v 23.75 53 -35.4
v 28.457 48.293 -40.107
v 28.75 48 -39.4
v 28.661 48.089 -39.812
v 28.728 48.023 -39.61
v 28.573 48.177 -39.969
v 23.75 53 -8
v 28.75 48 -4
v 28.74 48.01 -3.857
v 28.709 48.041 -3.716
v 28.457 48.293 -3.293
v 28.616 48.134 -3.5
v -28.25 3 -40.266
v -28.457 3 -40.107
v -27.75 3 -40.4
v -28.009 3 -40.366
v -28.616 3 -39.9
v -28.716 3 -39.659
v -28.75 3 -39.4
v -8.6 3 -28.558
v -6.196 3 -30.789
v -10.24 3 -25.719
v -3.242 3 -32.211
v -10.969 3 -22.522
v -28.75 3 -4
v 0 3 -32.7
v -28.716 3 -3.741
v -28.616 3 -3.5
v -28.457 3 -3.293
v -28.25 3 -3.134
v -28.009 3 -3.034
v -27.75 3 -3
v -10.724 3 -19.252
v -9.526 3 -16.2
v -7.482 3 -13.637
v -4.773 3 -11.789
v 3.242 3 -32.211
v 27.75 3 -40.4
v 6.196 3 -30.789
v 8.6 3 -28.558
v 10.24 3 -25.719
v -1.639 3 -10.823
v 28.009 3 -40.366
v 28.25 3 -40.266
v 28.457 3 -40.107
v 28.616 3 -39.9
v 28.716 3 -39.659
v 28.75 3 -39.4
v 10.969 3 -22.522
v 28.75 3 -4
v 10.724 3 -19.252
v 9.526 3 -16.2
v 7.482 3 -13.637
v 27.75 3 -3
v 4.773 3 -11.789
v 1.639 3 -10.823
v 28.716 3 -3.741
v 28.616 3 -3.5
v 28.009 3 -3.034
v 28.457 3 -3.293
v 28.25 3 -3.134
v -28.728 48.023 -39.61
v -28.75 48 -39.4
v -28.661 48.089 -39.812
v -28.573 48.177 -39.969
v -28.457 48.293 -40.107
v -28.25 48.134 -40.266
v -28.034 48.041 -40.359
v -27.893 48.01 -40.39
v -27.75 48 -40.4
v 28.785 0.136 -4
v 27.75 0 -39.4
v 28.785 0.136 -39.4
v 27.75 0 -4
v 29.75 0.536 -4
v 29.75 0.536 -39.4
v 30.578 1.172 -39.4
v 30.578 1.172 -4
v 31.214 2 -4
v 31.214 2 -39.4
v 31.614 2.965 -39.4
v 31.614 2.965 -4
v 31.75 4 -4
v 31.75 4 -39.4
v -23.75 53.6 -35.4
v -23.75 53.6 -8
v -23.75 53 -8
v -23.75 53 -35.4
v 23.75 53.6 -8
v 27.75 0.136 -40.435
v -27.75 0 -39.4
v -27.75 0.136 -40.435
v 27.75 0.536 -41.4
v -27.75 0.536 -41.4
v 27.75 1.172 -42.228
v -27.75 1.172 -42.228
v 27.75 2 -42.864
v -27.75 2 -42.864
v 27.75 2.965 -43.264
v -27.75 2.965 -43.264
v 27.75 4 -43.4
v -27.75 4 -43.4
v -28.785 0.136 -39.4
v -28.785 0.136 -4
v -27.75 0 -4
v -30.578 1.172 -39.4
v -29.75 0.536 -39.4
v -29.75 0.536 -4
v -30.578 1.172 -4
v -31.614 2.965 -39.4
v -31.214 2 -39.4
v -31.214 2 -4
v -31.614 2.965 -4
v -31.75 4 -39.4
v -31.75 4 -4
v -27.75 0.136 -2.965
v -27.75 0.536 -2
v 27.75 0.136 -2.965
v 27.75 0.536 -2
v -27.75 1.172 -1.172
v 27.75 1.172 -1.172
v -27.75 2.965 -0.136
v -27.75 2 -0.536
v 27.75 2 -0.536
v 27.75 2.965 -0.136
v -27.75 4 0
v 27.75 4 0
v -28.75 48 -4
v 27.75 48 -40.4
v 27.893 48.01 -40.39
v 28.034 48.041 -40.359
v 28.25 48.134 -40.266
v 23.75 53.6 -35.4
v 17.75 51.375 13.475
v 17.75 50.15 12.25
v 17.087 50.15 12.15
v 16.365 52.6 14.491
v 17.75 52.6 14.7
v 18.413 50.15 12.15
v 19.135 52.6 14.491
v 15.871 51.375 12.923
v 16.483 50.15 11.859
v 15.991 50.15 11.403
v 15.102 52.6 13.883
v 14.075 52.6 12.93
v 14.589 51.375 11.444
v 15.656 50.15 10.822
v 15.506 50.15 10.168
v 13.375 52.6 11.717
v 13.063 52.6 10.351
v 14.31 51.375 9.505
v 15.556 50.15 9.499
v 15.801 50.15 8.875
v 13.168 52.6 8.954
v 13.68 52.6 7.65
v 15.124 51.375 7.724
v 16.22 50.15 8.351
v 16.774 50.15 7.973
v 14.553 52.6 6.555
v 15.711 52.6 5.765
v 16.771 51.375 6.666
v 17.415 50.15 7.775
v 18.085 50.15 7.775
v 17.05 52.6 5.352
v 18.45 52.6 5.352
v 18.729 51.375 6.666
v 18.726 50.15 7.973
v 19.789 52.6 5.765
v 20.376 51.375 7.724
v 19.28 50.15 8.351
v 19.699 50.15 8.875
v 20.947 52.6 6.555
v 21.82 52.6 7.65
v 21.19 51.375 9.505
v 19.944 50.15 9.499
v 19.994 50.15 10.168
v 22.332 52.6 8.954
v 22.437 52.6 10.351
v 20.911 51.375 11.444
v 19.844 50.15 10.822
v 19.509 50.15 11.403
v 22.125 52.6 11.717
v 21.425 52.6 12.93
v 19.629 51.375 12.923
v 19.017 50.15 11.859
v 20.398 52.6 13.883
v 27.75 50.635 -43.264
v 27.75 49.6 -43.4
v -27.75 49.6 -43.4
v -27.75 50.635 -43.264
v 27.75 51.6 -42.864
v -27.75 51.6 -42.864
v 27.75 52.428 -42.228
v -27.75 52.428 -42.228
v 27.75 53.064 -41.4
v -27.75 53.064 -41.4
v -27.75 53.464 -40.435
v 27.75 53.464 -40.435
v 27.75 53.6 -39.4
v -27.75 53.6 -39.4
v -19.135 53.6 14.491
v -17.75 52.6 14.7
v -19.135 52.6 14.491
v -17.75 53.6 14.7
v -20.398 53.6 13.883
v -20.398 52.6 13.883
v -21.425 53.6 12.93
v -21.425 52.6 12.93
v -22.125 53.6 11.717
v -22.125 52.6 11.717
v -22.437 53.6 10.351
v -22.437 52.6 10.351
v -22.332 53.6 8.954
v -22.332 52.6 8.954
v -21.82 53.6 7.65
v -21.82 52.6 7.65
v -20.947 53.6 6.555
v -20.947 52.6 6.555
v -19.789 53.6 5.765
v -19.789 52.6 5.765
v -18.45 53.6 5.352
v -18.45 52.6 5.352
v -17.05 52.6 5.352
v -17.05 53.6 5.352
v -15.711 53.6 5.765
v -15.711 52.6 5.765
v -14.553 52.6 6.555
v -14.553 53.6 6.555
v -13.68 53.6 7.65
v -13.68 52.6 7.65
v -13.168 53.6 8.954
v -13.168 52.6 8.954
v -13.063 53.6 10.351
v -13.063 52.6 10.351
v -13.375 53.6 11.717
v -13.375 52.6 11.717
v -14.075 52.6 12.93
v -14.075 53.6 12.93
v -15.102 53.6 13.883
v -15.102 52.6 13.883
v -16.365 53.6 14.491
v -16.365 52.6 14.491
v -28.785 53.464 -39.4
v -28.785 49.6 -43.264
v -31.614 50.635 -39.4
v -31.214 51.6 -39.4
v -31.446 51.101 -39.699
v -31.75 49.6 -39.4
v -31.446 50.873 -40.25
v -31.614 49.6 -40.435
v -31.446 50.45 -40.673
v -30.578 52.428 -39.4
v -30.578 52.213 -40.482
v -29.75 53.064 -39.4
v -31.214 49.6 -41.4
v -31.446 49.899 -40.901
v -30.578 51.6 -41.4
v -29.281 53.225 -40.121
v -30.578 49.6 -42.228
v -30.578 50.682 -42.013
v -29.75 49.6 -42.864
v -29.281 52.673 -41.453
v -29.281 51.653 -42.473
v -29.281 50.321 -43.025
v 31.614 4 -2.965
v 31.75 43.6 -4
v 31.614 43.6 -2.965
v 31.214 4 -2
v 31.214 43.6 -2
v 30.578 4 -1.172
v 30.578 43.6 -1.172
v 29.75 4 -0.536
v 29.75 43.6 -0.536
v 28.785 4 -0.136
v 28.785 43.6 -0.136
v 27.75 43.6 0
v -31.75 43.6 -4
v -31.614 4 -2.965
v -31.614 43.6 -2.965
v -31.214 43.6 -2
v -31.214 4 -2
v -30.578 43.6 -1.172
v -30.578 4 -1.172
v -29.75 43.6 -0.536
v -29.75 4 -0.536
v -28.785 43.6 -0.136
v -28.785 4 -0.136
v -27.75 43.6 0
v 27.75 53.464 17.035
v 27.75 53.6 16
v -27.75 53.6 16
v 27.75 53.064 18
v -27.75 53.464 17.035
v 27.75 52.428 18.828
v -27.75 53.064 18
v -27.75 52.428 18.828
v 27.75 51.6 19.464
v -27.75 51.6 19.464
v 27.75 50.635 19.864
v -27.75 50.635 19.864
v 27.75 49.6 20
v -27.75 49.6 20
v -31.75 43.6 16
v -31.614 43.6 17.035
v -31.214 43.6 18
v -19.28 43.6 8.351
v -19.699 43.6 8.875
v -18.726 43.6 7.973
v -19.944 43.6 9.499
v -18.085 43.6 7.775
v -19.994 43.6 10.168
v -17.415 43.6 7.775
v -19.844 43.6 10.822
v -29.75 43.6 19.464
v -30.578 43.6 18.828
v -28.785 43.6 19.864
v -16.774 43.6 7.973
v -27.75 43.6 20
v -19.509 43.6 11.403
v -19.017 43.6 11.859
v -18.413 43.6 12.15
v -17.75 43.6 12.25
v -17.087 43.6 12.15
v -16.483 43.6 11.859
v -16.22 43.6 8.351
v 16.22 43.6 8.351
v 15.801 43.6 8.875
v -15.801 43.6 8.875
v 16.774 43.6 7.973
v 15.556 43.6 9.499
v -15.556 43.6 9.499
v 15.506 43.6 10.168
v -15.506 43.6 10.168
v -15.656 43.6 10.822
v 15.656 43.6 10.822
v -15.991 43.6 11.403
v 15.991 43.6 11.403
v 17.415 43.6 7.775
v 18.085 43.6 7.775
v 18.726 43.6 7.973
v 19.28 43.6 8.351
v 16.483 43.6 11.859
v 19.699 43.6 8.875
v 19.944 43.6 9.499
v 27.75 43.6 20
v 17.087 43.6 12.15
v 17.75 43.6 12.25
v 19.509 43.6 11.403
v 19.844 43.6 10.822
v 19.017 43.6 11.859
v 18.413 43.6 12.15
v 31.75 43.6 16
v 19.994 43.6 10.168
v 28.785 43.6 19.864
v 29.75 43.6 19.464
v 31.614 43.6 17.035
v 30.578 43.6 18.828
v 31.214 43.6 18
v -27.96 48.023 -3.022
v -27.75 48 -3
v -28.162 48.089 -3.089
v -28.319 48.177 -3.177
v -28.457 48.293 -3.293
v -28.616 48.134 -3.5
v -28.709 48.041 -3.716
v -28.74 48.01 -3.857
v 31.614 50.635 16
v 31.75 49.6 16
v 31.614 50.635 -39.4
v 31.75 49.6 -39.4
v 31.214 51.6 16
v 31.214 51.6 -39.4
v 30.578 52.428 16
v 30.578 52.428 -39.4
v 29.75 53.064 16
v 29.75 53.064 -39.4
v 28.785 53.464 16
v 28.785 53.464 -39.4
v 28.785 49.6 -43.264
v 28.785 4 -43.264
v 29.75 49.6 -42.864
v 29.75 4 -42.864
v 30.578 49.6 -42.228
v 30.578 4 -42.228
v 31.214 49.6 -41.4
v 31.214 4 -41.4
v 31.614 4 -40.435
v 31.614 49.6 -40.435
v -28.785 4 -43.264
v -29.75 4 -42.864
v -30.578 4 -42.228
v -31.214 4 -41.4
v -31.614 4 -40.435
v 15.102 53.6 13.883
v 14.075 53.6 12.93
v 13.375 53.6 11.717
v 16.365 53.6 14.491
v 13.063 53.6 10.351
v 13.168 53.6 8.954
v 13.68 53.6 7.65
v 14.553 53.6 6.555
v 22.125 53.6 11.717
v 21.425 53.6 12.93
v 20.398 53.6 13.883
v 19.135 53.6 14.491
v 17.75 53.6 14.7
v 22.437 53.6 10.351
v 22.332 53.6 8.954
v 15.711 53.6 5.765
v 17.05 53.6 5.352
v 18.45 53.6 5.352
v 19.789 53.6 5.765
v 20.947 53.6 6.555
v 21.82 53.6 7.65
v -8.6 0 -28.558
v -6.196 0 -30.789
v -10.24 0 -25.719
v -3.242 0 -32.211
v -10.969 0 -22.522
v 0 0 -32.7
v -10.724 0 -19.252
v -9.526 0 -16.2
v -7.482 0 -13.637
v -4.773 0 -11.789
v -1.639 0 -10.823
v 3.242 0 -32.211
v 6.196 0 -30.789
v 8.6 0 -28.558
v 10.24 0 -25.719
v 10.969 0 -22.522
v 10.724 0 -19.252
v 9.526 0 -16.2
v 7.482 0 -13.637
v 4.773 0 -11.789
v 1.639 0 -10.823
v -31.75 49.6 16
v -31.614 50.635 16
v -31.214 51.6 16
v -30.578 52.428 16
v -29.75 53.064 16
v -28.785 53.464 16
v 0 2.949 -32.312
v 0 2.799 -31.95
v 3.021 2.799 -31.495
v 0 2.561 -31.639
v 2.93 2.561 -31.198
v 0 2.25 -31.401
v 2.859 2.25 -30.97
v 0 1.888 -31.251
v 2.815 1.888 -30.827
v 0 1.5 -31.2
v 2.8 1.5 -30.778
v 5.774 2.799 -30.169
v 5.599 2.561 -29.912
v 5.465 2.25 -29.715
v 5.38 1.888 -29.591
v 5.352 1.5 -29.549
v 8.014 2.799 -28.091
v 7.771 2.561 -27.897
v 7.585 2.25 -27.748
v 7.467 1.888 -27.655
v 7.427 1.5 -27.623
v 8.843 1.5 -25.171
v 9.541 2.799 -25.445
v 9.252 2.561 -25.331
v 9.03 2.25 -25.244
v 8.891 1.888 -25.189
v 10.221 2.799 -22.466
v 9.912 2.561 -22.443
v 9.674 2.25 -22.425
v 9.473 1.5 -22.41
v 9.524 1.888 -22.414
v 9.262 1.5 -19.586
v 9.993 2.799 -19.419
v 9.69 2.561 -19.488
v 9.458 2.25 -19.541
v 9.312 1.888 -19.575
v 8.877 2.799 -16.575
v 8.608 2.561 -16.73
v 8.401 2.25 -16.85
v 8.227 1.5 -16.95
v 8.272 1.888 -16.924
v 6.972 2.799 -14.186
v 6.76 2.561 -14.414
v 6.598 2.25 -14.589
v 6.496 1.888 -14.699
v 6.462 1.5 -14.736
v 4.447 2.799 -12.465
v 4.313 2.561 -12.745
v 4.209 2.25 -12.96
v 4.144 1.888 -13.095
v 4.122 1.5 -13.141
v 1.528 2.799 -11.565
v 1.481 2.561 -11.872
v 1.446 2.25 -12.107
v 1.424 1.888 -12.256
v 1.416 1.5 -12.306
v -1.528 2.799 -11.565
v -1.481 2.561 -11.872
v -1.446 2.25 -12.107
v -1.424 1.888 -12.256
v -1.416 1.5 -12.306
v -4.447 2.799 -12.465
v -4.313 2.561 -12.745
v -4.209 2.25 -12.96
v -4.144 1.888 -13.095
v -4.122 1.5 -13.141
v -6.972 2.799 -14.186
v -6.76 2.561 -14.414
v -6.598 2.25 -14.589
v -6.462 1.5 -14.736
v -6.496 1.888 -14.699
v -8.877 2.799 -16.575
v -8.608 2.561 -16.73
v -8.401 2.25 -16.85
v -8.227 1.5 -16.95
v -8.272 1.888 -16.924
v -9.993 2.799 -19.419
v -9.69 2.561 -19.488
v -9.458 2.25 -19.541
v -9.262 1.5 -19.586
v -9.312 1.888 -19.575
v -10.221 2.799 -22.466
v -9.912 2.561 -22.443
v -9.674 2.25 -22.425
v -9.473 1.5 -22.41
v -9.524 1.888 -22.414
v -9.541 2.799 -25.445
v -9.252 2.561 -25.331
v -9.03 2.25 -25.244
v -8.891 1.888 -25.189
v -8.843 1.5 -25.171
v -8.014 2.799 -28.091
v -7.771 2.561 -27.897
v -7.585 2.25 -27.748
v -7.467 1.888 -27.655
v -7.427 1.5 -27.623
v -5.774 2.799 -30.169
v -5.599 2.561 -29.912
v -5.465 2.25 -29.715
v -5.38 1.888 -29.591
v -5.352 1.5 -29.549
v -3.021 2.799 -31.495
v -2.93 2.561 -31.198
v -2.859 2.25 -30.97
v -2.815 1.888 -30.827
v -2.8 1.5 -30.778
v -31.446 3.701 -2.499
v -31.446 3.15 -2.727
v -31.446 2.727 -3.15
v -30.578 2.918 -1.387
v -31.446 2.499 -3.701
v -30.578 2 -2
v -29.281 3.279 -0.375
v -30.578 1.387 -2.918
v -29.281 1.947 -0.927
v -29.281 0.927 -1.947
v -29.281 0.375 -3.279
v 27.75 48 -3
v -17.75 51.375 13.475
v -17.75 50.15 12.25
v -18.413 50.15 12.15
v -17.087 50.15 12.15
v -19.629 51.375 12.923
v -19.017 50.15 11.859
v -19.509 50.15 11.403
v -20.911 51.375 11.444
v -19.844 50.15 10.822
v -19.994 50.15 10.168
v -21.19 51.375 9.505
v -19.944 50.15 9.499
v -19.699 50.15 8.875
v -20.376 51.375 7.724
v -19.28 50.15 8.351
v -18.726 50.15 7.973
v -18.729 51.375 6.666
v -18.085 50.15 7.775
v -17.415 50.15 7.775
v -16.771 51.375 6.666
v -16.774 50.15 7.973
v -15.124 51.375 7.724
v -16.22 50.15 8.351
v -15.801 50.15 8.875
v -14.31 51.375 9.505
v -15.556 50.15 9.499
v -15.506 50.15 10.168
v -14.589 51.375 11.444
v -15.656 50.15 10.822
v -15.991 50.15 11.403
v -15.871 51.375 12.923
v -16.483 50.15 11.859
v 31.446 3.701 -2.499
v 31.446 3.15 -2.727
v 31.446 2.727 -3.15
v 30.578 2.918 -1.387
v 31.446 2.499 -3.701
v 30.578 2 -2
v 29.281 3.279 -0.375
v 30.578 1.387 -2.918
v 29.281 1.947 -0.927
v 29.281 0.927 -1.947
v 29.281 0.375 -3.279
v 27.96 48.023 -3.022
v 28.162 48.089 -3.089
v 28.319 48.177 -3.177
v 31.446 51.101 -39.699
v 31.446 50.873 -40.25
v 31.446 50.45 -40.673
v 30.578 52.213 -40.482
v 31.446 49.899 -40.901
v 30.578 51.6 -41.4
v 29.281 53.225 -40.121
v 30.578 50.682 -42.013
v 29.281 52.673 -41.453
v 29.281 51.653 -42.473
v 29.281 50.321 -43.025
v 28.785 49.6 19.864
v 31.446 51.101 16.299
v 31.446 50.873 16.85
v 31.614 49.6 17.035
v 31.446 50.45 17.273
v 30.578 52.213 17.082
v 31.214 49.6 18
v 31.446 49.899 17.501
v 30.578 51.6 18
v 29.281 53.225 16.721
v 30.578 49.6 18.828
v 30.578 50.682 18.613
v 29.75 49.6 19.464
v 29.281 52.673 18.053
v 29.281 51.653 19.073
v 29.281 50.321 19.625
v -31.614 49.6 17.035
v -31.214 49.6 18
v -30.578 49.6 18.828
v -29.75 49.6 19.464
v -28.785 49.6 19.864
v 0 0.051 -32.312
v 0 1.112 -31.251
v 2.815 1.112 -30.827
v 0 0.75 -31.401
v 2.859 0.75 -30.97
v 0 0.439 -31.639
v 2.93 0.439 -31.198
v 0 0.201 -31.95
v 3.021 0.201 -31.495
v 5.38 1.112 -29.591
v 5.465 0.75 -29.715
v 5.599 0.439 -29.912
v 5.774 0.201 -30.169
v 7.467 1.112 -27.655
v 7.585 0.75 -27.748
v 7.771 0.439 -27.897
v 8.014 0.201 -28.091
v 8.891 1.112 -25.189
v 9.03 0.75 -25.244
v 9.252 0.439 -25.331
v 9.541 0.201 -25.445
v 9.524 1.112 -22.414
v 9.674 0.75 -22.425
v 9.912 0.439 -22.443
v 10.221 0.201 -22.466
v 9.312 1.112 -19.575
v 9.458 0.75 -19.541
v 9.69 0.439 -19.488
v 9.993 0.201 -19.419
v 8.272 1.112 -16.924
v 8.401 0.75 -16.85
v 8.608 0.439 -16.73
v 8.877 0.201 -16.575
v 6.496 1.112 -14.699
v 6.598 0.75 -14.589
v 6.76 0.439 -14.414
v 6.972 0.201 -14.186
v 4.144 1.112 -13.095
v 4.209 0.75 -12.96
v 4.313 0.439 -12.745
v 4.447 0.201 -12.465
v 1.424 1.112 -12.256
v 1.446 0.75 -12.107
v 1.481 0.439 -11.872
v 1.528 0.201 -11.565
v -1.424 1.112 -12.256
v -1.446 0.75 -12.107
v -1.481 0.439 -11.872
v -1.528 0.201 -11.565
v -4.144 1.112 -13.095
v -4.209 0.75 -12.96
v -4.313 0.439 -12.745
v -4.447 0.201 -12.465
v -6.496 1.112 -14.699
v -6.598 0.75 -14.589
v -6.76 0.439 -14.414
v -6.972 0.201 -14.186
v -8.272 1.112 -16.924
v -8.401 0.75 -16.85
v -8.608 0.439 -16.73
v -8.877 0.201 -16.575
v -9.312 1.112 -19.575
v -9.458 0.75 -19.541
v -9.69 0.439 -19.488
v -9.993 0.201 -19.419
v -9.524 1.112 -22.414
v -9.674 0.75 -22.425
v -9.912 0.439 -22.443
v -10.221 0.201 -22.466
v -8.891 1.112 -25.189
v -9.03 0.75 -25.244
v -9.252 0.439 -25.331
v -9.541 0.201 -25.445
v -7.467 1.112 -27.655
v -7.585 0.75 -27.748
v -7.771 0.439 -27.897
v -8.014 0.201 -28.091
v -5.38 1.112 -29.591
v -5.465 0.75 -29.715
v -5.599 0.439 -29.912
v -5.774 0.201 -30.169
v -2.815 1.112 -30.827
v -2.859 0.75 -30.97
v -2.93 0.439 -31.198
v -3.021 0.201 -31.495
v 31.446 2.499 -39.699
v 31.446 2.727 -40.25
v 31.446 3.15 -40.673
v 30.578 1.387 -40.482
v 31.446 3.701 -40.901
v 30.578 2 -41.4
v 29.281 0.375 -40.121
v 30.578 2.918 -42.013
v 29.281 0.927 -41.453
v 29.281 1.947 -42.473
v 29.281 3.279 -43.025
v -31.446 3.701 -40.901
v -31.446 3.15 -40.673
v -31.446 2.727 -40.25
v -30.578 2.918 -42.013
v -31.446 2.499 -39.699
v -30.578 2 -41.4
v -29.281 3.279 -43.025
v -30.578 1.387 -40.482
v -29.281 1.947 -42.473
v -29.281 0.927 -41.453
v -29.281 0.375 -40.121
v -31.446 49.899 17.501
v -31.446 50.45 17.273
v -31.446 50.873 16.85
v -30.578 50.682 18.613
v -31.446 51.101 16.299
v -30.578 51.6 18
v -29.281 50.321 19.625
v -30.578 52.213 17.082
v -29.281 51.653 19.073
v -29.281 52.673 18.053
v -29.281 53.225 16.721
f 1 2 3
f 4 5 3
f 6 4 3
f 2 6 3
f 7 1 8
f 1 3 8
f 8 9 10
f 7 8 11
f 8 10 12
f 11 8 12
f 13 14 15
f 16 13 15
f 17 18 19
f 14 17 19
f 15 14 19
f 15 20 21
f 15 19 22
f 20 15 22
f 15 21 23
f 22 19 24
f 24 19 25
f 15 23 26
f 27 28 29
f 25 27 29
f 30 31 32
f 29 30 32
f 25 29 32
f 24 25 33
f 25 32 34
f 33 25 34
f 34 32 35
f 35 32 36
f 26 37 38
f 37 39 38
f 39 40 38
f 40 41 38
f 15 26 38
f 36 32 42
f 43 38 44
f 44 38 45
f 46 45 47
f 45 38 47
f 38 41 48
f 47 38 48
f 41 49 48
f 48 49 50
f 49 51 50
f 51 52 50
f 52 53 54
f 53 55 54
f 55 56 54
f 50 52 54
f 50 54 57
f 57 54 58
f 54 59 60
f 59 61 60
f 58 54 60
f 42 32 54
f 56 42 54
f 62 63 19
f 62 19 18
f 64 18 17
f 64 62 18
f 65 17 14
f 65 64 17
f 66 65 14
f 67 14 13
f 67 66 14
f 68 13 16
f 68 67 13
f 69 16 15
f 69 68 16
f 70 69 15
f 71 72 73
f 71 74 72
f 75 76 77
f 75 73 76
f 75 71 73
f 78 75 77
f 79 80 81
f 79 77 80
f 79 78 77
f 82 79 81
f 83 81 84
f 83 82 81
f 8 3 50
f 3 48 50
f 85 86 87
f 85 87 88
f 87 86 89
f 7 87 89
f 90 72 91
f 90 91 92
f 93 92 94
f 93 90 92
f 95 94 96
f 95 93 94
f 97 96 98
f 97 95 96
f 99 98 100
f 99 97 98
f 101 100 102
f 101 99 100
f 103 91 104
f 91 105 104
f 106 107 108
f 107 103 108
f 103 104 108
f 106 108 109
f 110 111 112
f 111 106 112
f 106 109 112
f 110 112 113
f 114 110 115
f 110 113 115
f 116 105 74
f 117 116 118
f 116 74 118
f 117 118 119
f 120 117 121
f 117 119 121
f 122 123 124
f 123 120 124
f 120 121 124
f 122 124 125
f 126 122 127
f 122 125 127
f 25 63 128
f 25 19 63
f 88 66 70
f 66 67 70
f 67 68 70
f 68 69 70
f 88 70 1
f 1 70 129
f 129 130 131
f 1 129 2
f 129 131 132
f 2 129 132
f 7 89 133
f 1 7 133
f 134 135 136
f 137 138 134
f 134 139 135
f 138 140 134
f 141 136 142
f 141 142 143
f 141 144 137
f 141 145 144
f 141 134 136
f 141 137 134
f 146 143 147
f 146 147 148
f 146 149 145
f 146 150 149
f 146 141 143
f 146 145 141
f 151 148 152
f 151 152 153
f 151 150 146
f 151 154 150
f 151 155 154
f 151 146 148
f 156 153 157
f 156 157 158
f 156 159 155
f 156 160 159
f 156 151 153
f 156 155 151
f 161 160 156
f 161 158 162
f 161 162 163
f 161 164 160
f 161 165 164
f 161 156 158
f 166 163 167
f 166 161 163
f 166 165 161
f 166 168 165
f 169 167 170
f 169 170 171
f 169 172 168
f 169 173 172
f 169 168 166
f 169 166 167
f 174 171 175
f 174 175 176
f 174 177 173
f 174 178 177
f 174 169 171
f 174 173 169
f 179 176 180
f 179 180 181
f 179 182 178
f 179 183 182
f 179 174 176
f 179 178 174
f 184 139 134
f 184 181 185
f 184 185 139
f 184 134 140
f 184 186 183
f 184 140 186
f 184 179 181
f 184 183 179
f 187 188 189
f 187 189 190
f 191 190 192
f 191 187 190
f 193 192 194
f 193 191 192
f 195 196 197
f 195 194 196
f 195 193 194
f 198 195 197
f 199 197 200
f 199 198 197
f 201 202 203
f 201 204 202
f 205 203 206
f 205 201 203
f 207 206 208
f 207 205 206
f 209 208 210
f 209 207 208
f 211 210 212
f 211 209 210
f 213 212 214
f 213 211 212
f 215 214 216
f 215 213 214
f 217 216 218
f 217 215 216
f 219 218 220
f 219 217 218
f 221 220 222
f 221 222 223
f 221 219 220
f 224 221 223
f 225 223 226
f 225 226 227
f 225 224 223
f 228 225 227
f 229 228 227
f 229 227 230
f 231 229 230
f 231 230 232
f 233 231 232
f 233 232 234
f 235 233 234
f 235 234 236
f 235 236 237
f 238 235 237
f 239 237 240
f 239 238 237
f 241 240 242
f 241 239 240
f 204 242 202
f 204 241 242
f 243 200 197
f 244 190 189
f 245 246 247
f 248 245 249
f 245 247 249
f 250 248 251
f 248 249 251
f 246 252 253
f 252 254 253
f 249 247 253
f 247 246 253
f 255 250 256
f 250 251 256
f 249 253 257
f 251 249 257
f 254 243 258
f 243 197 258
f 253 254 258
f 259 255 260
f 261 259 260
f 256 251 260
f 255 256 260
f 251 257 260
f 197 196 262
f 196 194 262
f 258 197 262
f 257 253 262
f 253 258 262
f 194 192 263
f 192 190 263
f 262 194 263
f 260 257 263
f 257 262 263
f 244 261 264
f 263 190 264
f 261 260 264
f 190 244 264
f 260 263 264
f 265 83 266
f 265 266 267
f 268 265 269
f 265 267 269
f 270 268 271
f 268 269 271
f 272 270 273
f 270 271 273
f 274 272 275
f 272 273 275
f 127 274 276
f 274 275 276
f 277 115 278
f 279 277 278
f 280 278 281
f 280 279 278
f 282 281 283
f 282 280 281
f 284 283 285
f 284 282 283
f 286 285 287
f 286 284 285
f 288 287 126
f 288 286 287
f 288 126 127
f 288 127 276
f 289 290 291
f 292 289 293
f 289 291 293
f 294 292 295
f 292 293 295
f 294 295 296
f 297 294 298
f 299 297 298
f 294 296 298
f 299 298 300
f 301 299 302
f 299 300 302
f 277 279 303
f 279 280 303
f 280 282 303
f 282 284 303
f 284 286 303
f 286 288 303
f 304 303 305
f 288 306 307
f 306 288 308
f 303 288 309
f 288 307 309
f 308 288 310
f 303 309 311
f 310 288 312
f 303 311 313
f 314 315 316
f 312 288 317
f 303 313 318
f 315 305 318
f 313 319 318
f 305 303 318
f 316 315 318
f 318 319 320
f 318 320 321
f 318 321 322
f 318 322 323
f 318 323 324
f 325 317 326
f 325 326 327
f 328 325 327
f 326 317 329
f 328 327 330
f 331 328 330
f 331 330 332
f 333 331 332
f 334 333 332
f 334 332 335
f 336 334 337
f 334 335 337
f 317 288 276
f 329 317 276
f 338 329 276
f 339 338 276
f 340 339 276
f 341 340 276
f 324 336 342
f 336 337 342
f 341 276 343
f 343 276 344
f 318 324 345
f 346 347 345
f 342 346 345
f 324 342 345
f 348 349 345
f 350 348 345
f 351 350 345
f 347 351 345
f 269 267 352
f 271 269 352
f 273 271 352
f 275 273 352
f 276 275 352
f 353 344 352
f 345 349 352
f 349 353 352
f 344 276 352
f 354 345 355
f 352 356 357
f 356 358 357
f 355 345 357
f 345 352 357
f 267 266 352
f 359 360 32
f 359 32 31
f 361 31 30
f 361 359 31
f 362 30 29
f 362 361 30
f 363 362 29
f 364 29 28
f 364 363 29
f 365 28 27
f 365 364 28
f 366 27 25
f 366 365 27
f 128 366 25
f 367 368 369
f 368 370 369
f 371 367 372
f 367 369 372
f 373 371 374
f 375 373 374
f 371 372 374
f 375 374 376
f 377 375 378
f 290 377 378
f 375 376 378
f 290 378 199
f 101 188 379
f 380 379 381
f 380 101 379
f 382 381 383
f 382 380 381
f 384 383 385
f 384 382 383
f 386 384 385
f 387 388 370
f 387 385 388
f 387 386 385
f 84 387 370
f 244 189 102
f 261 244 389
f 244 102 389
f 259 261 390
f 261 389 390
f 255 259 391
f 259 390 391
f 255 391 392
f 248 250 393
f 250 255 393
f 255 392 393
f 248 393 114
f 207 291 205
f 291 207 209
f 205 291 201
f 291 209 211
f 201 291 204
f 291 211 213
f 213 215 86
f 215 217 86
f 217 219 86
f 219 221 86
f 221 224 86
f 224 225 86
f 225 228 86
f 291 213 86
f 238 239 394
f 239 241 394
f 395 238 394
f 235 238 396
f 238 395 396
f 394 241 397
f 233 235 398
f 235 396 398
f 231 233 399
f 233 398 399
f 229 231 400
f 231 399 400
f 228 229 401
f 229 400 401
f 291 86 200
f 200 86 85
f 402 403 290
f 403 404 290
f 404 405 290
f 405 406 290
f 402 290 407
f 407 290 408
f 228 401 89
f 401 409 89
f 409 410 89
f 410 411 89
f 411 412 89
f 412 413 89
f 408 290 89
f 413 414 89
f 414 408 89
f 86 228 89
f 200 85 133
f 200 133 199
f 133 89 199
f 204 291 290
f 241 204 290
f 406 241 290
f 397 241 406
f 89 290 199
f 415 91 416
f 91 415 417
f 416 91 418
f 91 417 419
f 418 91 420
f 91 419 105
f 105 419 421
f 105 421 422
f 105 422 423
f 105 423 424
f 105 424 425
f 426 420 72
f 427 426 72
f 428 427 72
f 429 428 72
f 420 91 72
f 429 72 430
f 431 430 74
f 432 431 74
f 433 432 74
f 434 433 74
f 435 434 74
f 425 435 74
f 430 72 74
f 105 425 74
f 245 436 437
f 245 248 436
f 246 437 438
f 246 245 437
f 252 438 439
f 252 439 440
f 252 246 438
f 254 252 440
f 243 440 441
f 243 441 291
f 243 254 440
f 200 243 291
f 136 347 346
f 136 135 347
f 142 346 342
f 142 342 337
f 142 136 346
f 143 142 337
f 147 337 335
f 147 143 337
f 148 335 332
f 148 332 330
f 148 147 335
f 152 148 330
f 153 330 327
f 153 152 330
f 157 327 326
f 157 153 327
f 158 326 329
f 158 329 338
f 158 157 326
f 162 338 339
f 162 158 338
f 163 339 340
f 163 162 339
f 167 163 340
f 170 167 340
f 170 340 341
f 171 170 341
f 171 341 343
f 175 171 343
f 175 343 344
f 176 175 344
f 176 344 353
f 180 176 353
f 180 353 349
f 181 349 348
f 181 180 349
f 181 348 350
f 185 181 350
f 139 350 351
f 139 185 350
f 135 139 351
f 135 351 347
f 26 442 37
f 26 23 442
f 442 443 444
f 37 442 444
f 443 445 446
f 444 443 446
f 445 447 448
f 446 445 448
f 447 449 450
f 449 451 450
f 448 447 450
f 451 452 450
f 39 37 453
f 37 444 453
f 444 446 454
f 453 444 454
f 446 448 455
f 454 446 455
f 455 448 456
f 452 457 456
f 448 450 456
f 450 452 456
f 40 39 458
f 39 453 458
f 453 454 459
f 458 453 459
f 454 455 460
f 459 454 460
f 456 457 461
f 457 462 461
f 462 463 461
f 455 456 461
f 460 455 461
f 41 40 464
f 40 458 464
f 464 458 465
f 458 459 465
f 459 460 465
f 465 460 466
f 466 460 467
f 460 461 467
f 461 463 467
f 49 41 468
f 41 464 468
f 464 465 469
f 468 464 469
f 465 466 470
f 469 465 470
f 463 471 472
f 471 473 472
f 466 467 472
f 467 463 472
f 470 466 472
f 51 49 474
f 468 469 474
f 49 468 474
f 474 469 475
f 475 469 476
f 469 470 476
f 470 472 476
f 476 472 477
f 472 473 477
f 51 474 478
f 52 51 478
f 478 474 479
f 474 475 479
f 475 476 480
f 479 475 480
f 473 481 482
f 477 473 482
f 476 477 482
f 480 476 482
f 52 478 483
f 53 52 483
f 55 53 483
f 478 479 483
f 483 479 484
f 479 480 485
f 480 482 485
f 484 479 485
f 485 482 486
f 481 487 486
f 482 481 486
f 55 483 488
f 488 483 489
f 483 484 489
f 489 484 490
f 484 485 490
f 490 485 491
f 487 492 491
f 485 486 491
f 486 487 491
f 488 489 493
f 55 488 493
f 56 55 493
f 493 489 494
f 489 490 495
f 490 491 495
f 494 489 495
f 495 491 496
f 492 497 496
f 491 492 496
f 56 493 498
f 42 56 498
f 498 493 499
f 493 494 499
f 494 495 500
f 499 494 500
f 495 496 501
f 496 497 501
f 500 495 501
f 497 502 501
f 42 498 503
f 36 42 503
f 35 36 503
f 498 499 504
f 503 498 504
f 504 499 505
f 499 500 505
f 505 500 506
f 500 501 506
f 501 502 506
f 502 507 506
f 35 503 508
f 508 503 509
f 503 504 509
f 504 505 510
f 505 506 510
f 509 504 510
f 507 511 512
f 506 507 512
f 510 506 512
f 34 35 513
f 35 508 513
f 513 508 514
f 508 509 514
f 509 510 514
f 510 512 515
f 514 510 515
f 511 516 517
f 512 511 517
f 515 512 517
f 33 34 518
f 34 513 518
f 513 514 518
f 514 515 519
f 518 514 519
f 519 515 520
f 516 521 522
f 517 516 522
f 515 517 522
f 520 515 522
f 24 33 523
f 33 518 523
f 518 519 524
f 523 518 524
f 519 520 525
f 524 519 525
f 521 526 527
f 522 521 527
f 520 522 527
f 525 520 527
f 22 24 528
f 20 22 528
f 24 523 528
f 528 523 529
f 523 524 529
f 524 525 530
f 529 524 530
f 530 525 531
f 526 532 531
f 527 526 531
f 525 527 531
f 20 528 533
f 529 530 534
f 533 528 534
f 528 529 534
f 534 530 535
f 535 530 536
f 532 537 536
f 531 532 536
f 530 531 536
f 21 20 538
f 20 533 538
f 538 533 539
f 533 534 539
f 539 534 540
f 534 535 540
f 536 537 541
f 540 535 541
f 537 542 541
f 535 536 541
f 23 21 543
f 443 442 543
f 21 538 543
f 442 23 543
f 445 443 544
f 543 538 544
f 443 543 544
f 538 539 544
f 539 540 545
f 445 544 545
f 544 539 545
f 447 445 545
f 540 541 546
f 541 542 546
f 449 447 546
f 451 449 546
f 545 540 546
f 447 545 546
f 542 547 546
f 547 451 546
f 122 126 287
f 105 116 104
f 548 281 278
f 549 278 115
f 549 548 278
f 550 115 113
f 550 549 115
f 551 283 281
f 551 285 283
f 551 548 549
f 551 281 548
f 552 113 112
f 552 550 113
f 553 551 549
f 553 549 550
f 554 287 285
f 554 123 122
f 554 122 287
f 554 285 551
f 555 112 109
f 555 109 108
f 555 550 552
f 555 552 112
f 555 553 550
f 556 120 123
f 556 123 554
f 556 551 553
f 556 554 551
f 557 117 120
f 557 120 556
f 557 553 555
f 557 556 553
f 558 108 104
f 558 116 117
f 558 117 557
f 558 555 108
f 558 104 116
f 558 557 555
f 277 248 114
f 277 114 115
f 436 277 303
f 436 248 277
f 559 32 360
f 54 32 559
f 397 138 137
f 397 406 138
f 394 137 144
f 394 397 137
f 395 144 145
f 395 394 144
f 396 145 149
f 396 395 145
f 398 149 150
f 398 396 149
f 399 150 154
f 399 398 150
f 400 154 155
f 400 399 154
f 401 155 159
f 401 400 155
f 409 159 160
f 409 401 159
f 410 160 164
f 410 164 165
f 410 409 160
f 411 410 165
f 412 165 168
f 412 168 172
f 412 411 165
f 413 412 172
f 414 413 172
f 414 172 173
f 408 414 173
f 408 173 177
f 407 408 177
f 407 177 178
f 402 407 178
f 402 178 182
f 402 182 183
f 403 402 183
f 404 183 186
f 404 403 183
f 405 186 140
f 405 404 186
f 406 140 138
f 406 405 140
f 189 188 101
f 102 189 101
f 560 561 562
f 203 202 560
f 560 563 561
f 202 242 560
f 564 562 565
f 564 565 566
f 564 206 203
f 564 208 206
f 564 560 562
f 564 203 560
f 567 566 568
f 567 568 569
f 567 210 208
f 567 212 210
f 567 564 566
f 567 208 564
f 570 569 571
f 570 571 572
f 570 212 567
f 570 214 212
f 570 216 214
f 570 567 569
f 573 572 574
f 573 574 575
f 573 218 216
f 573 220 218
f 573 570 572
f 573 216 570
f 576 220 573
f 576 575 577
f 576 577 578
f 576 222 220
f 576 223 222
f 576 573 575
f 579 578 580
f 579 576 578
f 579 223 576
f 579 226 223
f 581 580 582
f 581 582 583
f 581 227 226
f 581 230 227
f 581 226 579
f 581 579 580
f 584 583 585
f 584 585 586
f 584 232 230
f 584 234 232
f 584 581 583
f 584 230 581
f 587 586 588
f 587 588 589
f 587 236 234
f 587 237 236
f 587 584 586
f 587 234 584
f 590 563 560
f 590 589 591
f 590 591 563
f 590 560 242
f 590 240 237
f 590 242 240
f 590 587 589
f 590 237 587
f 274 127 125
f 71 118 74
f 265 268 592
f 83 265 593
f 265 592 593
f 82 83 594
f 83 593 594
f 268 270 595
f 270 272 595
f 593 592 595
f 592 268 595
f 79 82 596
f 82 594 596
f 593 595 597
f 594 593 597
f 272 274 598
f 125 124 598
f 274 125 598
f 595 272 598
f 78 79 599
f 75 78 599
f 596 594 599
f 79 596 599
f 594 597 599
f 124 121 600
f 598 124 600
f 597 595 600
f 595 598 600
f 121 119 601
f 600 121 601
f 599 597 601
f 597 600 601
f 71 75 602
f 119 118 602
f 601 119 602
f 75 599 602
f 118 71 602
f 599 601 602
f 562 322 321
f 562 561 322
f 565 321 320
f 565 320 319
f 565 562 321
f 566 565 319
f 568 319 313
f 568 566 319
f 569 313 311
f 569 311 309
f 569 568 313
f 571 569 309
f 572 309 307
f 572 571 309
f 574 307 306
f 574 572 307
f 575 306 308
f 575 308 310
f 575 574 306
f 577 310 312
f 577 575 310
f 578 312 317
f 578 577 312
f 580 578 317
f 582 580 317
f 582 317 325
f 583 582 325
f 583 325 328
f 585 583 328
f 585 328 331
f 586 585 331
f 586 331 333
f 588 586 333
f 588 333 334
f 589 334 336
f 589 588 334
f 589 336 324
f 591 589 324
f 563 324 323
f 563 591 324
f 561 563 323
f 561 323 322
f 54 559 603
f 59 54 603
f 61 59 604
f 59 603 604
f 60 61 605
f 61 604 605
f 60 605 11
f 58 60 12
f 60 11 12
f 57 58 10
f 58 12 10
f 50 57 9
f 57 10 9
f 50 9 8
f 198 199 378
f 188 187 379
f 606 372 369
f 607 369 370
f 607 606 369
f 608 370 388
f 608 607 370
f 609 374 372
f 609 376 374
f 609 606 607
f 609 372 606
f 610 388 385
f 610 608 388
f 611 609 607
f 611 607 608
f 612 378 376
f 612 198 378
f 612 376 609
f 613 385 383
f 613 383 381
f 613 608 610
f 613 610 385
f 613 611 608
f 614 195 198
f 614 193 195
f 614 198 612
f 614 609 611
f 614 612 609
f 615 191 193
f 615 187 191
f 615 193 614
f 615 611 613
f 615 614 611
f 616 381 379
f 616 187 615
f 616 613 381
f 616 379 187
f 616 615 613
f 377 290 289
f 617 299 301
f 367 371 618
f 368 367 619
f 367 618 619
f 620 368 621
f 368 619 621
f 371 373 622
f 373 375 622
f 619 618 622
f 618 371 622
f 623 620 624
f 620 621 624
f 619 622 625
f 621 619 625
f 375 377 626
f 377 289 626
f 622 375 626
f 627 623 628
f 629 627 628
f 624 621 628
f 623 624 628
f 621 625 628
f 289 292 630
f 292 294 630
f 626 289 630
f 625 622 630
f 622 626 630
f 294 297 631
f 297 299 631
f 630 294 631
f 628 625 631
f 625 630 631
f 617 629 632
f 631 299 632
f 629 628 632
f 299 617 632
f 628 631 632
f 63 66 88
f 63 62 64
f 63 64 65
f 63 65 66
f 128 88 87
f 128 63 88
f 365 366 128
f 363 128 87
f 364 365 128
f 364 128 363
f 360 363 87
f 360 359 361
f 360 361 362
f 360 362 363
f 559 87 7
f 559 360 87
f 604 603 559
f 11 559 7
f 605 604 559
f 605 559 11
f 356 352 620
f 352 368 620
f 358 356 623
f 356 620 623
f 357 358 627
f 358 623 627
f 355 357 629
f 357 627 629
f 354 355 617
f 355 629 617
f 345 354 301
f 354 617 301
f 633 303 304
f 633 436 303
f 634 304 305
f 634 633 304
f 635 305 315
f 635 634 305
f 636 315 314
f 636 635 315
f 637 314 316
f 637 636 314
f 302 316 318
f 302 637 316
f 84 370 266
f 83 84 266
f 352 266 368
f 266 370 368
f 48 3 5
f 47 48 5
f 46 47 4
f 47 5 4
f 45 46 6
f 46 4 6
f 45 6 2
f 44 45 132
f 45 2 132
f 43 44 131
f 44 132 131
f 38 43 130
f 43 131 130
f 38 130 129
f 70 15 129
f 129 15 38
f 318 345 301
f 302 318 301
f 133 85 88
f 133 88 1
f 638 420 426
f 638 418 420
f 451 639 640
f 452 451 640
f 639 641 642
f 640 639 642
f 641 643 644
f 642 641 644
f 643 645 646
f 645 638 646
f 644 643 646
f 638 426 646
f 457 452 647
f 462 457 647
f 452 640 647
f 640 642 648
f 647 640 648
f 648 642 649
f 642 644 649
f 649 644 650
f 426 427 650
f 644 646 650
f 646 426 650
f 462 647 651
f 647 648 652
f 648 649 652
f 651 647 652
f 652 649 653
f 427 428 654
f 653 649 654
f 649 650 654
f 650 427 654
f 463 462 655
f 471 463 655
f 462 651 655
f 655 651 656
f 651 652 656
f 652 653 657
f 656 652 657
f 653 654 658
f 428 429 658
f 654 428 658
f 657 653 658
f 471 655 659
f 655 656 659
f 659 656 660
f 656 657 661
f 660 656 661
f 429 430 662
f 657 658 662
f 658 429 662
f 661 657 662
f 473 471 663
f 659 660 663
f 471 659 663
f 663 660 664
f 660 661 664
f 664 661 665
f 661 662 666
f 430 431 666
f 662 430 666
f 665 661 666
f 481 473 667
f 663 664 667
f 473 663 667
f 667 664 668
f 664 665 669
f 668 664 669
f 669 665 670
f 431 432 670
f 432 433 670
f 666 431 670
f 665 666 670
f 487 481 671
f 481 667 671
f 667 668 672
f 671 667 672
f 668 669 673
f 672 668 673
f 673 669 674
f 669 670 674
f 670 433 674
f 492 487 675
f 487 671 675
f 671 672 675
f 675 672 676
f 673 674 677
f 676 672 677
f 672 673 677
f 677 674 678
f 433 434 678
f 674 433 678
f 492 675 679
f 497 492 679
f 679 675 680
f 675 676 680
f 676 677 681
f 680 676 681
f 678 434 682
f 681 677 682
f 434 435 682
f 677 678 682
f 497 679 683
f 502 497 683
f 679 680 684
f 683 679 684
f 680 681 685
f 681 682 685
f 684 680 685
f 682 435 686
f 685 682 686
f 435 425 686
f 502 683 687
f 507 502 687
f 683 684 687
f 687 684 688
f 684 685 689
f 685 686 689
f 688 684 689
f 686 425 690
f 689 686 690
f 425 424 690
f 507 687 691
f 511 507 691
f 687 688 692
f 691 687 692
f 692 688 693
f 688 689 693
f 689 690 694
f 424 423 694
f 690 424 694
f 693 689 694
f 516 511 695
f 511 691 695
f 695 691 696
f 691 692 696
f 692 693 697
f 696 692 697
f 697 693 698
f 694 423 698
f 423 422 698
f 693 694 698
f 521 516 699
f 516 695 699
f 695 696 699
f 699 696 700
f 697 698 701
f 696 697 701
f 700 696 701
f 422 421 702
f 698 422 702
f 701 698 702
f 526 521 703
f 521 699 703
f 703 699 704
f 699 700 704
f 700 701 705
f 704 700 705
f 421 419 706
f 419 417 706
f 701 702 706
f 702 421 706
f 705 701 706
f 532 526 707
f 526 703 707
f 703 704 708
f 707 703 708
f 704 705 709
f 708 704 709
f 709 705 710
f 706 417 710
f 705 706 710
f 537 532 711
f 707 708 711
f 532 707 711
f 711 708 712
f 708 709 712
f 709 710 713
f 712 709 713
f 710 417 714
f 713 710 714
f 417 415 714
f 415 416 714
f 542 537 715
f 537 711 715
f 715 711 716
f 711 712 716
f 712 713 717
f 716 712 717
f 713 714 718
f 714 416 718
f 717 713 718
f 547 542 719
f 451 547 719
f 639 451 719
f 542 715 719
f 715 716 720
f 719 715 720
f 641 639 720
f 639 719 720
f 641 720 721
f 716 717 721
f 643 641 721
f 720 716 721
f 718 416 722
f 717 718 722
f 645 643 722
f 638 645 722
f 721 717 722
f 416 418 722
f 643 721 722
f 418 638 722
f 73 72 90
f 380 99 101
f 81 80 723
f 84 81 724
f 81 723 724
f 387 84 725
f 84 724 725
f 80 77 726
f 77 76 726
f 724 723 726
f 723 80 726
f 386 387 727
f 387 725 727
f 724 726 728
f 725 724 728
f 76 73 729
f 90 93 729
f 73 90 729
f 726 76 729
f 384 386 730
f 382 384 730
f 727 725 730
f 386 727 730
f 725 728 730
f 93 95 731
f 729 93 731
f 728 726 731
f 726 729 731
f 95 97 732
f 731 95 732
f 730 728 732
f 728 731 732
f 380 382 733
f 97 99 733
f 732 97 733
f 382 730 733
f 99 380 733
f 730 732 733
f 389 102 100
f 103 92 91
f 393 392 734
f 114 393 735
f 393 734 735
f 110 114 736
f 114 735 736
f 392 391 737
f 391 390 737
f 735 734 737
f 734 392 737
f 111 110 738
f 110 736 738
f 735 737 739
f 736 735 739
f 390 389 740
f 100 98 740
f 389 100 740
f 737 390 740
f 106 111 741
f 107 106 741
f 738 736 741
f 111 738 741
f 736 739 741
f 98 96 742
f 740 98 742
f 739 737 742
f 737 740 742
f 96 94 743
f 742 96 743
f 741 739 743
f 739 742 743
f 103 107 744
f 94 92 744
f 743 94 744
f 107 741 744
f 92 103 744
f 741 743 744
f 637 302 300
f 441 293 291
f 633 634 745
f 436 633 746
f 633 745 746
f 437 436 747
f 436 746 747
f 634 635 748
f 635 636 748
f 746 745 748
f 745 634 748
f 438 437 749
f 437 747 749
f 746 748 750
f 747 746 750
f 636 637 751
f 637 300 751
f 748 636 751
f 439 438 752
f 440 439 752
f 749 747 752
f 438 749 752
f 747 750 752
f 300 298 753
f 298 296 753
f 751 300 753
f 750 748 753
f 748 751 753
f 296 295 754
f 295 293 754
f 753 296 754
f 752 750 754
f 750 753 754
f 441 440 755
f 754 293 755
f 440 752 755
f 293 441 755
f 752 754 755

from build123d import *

# Parameters (mm, degrees)
PROFILE_EXTRUDE_DEPTH         = 31.75
INTERIOR_START                = -3
INTERIOR_SKETCH_W             = 57.5
INTERIOR_SKETCH_H             = 37.4
INTERIOR_CUT_DEPTH            = 50
OPENING_CUT_REACH             = 77.925
OPENING_SKETCH_W              = 47.5
OPENING_SKETCH_H              = 27.4
INSIDE_TOP_CHAMFER_SIZE       = 5
INSIDE_FILLETS_R              = 1
WIRE_OUTLET_CUT_REACH         = 77.925
WIRE_OUTLET_CUT_SKETCH_R      = 9.5
WIRE_OUTLET_FILLET_R          = 1.5
TOP_FILLETS_R                 = 4
M4_MOUNTING_SCREWS_AT_2_COUNT = 2
M4_MOUNTING_SCREWS_AT_2_PITCH = 35.5


with BuildPart() as part:
    # Profile Sketch → Profile Extrude (new, symmetric)
    with BuildSketch(Plane(origin=(0, 0, 0), x_dir=(0, 0, -1), z_dir=(1, 0, 0))):
        Polygon((0, 0), (0, 43.6), (-20, 43.6), (-20, 53.6), (43.4, 53.6), (43.4, 0), align=None)
    extrude(amount=PROFILE_EXTRUDE_DEPTH, both=True)

    # Interior Sketch → Interior Cut (cut)
    with BuildSketch(Plane.XZ.offset(INTERIOR_START)):
        with Locations((0, -21.7)):
            Rectangle(INTERIOR_SKETCH_W, INTERIOR_SKETCH_H)
    extrude(amount=-INTERIOR_CUT_DEPTH, mode=Mode.SUBTRACT)

    # Opening Sketch → Opening Cut (cut, up to next)
    with BuildSketch(Plane(origin=(0, 53.6, 0), x_dir=(1, 0, 0), z_dir=(0, 1, 0)), mode=Mode.PRIVATE) as opening_cut_sk1:
        with Locations((0, 21.7)):
            Rectangle(OPENING_SKETCH_W, OPENING_SKETCH_H)
    opening_cut_tool1 = extrude(opening_cut_sk1.sketch, amount=-OPENING_CUT_REACH, mode=Mode.PRIVATE) & part.part
    add(opening_cut_tool1.solids().sort_by_distance((0, 53.6, -21.7))[0], mode=Mode.SUBTRACT)

    # Inside Top Chamfer
    inside_top_chamfer_edges = [part.edges().sort_by_distance(p)[0] for p in [
        (0, 53, -3),
        (28.75, 53, -21.7),
        (0, 53, -40.4),
        (-28.75, 53, -21.7),
    ]]
    chamfer(inside_top_chamfer_edges, length=INSIDE_TOP_CHAMFER_SIZE - 0.0001)  # a hair under: the kernel refuses the full size

    # Inside Fillets
    inside_fillets_edges = [part.edges().sort_by_distance(p)[0] for p in [
        (28.75, 25.50005, -40.4),
        (28.75, 25.50005, -3),
        (-28.75, 25.50005, -40.4),
        (-28.75, 25.50005, -3),
    ]]
    fillet(inside_fillets_edges, radius=INSIDE_FILLETS_R)

    # Wire Outlet Cut Sketch → Wire Outlet Cut (cut, up to next)
    with BuildSketch(Plane.XZ, mode=Mode.PRIVATE) as wire_outlet_cut_sk1:
        with Locations(Location((0, -21.7, 0), (0, 0, 270))):
            Circle(WIRE_OUTLET_CUT_SKETCH_R)
    wire_outlet_cut_tool1 = extrude(wire_outlet_cut_sk1.sketch, amount=-WIRE_OUTLET_CUT_REACH, mode=Mode.PRIVATE) & part.part
    add(wire_outlet_cut_tool1.solids().sort_by_distance((0, 0, -21.7))[0], mode=Mode.SUBTRACT)

    # Wire Outlet Fillet
    wire_outlet_fillet_edges = [part.edges().sort_by_distance(p)[0] for p in [
        (0, 0, -12.2),
        (0, 3, -12.2),
    ]]
    fillet(wire_outlet_fillet_edges, radius=WIRE_OUTLET_FILLET_R - 0.0001)  # a hair under: the kernel refuses the full size

    # Top Fillets
    top_fillets_edges = [part.edges().sort_by_distance(p)[0] for p in [
        (0, 0, 0),
        (0, 53.6, 20),
        (0, 53.6, -43.4),
        (0, 0, -43.4),
        (31.75, 53.6, -11.7),
        (31.75, 48.6, 20),
        (31.75, 21.8, 0),
        (31.75, 0, -21.7),
        (-31.75, 21.8, 0),
        (-31.75, 48.6, 20),
        (-31.75, 53.6, -11.7),
        (-31.75, 26.8, -43.4),
        (-31.75, 0, -21.7),
        (31.75, 26.8, -43.4),
    ]]
    fillet(top_fillets_edges, radius=TOP_FILLETS_R)

    # M4 Mounting Screws Profile Sketch → M4 Mounting Screws (revolve, cut)
    with BuildSketch(Plane(origin=(-17.75, 53.6, 10), x_dir=(0, 0, 1), z_dir=(1, 0, 0))):
        Polygon((0, 0), (0, 10), (2.25, 10), (2.25, 3.45), (4.7, 1), (4.7, 0), align=None)
    m4_mounting_screws = revolve(axis=Axis((-17.75, 59.95, 10), (0, -1, 0)), mode=Mode.SUBTRACT)

    # M4 Mounting Screws at 2: M4 Mounting Screws ×2
    with Locations(*[(i * M4_MOUNTING_SCREWS_AT_2_PITCH, 0, 0) for i in range(1, M4_MOUNTING_SCREWS_AT_2_COUNT)]):
        add(m4_mounting_screws, mode=Mode.SUBTRACT)


solid = part.part
